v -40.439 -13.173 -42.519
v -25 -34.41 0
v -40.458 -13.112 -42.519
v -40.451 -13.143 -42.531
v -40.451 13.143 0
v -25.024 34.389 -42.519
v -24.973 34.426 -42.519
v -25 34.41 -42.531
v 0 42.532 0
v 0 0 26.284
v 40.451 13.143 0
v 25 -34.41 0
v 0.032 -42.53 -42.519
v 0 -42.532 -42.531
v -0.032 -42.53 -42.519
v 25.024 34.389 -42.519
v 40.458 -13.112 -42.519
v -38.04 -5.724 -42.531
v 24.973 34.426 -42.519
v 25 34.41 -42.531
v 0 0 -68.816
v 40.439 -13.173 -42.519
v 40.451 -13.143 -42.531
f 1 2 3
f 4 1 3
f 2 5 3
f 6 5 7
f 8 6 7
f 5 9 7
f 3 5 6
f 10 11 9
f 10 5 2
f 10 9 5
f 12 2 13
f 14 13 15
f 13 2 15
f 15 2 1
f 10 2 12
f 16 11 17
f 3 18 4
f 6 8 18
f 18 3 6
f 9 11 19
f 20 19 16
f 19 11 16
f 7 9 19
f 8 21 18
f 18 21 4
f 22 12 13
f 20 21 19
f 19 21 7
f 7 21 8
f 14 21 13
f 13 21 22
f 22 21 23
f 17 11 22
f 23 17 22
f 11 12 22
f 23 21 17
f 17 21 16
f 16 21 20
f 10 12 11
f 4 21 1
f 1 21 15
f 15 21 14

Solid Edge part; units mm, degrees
sketch "Sketch1" plane through (0, 0, 0) normal (0, 0, 1) x (1, 0, 0)
  circle A0 centre (0, 0) radius 42.5325
extrude "Protrusion1" add sketch "Sketch1" along normal blind 111.0642
sketch "Sketch2" plane through (0, 0, 0) normal (1, 0, 0) x (0, 1, 0)
  line L0 (-34.4095, 0) -> (0, 26.2845)
extrude "ExtrudedCutout_6" cut sketch "Sketch2" along normal mid plane 236.5553 material side at (0, -17.2351, 13.182)
pattern_circular "Pattern1" count 5 over 360 about axis through (0, 0, 0) along (0, 0, 1) of "ExtrudedCutout_6"
sketch "Sketch3" plane through (0, 0, 0) normal (0, 0, 1) x (1, 0, 0)
  circle A0 centre (0, 0) radius 42.5325
extrude "ExtrudedProtrusion_3" add sketch "Sketch3" against normal blind 146.9962
sketch "Sketch4" plane through (0, 0, 0) normal (1, 0, 0) x (0, 1, 0)
  line L0 (-34.4095, 0) -> (-42.5325, -42.5312)
extrude "ExtrudedCutout_11" cut sketch "Sketch4" along normal mid plane 186.9173 material side at (0, -38.5201, -21.2562)
pattern_circular "Pattern2" count 5 over 360 about axis through (0, 0, 0) along (0, 0, 1) of "ExtrudedCutout_11"
sketch "Sketch5" plane through (0, 0, -146.9962) normal (0, 0, -1) x (0, 1, 0)
  circle A0 centre (0, 0) radius 42.5325
extrude "Cutout9" cut sketch "Sketch5" along normal mid plane 208.93
sketch "Sketch6" plane through (0, 0, 0) normal (1, 0, 0) x (0, 1, 0)
  line L0 (34.4237, -42.5312) -> (42.5325, 0)
extrude "ExtrudedCutout_19" cut sketch "Sketch6" along normal mid plane 152.0733 material side at (0, 38.5272, -21.275)
pattern_circular "Pattern3" count 5 over 360 about axis through (0, 0, -42.5312) along (0, 0, -1) of "ExtrudedCutout_19"
sketch "Sketch7" plane through (0, -4.0567, -42.5312) normal (0, 0, -1) x (1, 0, 0)
  line L0 (-25, -38.4662) -> (25, -38.4662)
  line L1 (25, -38.4662) -> (40.4509, 9.0866)
  line L2 (40.4509, 9.0866) -> (0, 38.4758)
  line L3 (0, 38.4758) -> (-40.4508, 9.0866)
  line L4 (-40.4508, 9.0866) -> (-25, -38.4662)
extrude "ExtrudedProtrusion_5" add sketch "Sketch7" along normal blind 53.0273
sketch "Sketch8" plane through (0, 0, 0) normal (1, 0, 0) x (0, 1, 0)
  line L0 (34.4095, -42.5312) -> (0, -68.8157)
extrude "ExtrudedCutout_29" cut sketch "Sketch8" along normal mid plane 468.9384 material side at (0, 17.2351, -55.7132)
pattern_circular "Pattern4" count 5 over 360 about axis through (0, 0, 0) along (0, 0, 1) of "ExtrudedCutout_29"
